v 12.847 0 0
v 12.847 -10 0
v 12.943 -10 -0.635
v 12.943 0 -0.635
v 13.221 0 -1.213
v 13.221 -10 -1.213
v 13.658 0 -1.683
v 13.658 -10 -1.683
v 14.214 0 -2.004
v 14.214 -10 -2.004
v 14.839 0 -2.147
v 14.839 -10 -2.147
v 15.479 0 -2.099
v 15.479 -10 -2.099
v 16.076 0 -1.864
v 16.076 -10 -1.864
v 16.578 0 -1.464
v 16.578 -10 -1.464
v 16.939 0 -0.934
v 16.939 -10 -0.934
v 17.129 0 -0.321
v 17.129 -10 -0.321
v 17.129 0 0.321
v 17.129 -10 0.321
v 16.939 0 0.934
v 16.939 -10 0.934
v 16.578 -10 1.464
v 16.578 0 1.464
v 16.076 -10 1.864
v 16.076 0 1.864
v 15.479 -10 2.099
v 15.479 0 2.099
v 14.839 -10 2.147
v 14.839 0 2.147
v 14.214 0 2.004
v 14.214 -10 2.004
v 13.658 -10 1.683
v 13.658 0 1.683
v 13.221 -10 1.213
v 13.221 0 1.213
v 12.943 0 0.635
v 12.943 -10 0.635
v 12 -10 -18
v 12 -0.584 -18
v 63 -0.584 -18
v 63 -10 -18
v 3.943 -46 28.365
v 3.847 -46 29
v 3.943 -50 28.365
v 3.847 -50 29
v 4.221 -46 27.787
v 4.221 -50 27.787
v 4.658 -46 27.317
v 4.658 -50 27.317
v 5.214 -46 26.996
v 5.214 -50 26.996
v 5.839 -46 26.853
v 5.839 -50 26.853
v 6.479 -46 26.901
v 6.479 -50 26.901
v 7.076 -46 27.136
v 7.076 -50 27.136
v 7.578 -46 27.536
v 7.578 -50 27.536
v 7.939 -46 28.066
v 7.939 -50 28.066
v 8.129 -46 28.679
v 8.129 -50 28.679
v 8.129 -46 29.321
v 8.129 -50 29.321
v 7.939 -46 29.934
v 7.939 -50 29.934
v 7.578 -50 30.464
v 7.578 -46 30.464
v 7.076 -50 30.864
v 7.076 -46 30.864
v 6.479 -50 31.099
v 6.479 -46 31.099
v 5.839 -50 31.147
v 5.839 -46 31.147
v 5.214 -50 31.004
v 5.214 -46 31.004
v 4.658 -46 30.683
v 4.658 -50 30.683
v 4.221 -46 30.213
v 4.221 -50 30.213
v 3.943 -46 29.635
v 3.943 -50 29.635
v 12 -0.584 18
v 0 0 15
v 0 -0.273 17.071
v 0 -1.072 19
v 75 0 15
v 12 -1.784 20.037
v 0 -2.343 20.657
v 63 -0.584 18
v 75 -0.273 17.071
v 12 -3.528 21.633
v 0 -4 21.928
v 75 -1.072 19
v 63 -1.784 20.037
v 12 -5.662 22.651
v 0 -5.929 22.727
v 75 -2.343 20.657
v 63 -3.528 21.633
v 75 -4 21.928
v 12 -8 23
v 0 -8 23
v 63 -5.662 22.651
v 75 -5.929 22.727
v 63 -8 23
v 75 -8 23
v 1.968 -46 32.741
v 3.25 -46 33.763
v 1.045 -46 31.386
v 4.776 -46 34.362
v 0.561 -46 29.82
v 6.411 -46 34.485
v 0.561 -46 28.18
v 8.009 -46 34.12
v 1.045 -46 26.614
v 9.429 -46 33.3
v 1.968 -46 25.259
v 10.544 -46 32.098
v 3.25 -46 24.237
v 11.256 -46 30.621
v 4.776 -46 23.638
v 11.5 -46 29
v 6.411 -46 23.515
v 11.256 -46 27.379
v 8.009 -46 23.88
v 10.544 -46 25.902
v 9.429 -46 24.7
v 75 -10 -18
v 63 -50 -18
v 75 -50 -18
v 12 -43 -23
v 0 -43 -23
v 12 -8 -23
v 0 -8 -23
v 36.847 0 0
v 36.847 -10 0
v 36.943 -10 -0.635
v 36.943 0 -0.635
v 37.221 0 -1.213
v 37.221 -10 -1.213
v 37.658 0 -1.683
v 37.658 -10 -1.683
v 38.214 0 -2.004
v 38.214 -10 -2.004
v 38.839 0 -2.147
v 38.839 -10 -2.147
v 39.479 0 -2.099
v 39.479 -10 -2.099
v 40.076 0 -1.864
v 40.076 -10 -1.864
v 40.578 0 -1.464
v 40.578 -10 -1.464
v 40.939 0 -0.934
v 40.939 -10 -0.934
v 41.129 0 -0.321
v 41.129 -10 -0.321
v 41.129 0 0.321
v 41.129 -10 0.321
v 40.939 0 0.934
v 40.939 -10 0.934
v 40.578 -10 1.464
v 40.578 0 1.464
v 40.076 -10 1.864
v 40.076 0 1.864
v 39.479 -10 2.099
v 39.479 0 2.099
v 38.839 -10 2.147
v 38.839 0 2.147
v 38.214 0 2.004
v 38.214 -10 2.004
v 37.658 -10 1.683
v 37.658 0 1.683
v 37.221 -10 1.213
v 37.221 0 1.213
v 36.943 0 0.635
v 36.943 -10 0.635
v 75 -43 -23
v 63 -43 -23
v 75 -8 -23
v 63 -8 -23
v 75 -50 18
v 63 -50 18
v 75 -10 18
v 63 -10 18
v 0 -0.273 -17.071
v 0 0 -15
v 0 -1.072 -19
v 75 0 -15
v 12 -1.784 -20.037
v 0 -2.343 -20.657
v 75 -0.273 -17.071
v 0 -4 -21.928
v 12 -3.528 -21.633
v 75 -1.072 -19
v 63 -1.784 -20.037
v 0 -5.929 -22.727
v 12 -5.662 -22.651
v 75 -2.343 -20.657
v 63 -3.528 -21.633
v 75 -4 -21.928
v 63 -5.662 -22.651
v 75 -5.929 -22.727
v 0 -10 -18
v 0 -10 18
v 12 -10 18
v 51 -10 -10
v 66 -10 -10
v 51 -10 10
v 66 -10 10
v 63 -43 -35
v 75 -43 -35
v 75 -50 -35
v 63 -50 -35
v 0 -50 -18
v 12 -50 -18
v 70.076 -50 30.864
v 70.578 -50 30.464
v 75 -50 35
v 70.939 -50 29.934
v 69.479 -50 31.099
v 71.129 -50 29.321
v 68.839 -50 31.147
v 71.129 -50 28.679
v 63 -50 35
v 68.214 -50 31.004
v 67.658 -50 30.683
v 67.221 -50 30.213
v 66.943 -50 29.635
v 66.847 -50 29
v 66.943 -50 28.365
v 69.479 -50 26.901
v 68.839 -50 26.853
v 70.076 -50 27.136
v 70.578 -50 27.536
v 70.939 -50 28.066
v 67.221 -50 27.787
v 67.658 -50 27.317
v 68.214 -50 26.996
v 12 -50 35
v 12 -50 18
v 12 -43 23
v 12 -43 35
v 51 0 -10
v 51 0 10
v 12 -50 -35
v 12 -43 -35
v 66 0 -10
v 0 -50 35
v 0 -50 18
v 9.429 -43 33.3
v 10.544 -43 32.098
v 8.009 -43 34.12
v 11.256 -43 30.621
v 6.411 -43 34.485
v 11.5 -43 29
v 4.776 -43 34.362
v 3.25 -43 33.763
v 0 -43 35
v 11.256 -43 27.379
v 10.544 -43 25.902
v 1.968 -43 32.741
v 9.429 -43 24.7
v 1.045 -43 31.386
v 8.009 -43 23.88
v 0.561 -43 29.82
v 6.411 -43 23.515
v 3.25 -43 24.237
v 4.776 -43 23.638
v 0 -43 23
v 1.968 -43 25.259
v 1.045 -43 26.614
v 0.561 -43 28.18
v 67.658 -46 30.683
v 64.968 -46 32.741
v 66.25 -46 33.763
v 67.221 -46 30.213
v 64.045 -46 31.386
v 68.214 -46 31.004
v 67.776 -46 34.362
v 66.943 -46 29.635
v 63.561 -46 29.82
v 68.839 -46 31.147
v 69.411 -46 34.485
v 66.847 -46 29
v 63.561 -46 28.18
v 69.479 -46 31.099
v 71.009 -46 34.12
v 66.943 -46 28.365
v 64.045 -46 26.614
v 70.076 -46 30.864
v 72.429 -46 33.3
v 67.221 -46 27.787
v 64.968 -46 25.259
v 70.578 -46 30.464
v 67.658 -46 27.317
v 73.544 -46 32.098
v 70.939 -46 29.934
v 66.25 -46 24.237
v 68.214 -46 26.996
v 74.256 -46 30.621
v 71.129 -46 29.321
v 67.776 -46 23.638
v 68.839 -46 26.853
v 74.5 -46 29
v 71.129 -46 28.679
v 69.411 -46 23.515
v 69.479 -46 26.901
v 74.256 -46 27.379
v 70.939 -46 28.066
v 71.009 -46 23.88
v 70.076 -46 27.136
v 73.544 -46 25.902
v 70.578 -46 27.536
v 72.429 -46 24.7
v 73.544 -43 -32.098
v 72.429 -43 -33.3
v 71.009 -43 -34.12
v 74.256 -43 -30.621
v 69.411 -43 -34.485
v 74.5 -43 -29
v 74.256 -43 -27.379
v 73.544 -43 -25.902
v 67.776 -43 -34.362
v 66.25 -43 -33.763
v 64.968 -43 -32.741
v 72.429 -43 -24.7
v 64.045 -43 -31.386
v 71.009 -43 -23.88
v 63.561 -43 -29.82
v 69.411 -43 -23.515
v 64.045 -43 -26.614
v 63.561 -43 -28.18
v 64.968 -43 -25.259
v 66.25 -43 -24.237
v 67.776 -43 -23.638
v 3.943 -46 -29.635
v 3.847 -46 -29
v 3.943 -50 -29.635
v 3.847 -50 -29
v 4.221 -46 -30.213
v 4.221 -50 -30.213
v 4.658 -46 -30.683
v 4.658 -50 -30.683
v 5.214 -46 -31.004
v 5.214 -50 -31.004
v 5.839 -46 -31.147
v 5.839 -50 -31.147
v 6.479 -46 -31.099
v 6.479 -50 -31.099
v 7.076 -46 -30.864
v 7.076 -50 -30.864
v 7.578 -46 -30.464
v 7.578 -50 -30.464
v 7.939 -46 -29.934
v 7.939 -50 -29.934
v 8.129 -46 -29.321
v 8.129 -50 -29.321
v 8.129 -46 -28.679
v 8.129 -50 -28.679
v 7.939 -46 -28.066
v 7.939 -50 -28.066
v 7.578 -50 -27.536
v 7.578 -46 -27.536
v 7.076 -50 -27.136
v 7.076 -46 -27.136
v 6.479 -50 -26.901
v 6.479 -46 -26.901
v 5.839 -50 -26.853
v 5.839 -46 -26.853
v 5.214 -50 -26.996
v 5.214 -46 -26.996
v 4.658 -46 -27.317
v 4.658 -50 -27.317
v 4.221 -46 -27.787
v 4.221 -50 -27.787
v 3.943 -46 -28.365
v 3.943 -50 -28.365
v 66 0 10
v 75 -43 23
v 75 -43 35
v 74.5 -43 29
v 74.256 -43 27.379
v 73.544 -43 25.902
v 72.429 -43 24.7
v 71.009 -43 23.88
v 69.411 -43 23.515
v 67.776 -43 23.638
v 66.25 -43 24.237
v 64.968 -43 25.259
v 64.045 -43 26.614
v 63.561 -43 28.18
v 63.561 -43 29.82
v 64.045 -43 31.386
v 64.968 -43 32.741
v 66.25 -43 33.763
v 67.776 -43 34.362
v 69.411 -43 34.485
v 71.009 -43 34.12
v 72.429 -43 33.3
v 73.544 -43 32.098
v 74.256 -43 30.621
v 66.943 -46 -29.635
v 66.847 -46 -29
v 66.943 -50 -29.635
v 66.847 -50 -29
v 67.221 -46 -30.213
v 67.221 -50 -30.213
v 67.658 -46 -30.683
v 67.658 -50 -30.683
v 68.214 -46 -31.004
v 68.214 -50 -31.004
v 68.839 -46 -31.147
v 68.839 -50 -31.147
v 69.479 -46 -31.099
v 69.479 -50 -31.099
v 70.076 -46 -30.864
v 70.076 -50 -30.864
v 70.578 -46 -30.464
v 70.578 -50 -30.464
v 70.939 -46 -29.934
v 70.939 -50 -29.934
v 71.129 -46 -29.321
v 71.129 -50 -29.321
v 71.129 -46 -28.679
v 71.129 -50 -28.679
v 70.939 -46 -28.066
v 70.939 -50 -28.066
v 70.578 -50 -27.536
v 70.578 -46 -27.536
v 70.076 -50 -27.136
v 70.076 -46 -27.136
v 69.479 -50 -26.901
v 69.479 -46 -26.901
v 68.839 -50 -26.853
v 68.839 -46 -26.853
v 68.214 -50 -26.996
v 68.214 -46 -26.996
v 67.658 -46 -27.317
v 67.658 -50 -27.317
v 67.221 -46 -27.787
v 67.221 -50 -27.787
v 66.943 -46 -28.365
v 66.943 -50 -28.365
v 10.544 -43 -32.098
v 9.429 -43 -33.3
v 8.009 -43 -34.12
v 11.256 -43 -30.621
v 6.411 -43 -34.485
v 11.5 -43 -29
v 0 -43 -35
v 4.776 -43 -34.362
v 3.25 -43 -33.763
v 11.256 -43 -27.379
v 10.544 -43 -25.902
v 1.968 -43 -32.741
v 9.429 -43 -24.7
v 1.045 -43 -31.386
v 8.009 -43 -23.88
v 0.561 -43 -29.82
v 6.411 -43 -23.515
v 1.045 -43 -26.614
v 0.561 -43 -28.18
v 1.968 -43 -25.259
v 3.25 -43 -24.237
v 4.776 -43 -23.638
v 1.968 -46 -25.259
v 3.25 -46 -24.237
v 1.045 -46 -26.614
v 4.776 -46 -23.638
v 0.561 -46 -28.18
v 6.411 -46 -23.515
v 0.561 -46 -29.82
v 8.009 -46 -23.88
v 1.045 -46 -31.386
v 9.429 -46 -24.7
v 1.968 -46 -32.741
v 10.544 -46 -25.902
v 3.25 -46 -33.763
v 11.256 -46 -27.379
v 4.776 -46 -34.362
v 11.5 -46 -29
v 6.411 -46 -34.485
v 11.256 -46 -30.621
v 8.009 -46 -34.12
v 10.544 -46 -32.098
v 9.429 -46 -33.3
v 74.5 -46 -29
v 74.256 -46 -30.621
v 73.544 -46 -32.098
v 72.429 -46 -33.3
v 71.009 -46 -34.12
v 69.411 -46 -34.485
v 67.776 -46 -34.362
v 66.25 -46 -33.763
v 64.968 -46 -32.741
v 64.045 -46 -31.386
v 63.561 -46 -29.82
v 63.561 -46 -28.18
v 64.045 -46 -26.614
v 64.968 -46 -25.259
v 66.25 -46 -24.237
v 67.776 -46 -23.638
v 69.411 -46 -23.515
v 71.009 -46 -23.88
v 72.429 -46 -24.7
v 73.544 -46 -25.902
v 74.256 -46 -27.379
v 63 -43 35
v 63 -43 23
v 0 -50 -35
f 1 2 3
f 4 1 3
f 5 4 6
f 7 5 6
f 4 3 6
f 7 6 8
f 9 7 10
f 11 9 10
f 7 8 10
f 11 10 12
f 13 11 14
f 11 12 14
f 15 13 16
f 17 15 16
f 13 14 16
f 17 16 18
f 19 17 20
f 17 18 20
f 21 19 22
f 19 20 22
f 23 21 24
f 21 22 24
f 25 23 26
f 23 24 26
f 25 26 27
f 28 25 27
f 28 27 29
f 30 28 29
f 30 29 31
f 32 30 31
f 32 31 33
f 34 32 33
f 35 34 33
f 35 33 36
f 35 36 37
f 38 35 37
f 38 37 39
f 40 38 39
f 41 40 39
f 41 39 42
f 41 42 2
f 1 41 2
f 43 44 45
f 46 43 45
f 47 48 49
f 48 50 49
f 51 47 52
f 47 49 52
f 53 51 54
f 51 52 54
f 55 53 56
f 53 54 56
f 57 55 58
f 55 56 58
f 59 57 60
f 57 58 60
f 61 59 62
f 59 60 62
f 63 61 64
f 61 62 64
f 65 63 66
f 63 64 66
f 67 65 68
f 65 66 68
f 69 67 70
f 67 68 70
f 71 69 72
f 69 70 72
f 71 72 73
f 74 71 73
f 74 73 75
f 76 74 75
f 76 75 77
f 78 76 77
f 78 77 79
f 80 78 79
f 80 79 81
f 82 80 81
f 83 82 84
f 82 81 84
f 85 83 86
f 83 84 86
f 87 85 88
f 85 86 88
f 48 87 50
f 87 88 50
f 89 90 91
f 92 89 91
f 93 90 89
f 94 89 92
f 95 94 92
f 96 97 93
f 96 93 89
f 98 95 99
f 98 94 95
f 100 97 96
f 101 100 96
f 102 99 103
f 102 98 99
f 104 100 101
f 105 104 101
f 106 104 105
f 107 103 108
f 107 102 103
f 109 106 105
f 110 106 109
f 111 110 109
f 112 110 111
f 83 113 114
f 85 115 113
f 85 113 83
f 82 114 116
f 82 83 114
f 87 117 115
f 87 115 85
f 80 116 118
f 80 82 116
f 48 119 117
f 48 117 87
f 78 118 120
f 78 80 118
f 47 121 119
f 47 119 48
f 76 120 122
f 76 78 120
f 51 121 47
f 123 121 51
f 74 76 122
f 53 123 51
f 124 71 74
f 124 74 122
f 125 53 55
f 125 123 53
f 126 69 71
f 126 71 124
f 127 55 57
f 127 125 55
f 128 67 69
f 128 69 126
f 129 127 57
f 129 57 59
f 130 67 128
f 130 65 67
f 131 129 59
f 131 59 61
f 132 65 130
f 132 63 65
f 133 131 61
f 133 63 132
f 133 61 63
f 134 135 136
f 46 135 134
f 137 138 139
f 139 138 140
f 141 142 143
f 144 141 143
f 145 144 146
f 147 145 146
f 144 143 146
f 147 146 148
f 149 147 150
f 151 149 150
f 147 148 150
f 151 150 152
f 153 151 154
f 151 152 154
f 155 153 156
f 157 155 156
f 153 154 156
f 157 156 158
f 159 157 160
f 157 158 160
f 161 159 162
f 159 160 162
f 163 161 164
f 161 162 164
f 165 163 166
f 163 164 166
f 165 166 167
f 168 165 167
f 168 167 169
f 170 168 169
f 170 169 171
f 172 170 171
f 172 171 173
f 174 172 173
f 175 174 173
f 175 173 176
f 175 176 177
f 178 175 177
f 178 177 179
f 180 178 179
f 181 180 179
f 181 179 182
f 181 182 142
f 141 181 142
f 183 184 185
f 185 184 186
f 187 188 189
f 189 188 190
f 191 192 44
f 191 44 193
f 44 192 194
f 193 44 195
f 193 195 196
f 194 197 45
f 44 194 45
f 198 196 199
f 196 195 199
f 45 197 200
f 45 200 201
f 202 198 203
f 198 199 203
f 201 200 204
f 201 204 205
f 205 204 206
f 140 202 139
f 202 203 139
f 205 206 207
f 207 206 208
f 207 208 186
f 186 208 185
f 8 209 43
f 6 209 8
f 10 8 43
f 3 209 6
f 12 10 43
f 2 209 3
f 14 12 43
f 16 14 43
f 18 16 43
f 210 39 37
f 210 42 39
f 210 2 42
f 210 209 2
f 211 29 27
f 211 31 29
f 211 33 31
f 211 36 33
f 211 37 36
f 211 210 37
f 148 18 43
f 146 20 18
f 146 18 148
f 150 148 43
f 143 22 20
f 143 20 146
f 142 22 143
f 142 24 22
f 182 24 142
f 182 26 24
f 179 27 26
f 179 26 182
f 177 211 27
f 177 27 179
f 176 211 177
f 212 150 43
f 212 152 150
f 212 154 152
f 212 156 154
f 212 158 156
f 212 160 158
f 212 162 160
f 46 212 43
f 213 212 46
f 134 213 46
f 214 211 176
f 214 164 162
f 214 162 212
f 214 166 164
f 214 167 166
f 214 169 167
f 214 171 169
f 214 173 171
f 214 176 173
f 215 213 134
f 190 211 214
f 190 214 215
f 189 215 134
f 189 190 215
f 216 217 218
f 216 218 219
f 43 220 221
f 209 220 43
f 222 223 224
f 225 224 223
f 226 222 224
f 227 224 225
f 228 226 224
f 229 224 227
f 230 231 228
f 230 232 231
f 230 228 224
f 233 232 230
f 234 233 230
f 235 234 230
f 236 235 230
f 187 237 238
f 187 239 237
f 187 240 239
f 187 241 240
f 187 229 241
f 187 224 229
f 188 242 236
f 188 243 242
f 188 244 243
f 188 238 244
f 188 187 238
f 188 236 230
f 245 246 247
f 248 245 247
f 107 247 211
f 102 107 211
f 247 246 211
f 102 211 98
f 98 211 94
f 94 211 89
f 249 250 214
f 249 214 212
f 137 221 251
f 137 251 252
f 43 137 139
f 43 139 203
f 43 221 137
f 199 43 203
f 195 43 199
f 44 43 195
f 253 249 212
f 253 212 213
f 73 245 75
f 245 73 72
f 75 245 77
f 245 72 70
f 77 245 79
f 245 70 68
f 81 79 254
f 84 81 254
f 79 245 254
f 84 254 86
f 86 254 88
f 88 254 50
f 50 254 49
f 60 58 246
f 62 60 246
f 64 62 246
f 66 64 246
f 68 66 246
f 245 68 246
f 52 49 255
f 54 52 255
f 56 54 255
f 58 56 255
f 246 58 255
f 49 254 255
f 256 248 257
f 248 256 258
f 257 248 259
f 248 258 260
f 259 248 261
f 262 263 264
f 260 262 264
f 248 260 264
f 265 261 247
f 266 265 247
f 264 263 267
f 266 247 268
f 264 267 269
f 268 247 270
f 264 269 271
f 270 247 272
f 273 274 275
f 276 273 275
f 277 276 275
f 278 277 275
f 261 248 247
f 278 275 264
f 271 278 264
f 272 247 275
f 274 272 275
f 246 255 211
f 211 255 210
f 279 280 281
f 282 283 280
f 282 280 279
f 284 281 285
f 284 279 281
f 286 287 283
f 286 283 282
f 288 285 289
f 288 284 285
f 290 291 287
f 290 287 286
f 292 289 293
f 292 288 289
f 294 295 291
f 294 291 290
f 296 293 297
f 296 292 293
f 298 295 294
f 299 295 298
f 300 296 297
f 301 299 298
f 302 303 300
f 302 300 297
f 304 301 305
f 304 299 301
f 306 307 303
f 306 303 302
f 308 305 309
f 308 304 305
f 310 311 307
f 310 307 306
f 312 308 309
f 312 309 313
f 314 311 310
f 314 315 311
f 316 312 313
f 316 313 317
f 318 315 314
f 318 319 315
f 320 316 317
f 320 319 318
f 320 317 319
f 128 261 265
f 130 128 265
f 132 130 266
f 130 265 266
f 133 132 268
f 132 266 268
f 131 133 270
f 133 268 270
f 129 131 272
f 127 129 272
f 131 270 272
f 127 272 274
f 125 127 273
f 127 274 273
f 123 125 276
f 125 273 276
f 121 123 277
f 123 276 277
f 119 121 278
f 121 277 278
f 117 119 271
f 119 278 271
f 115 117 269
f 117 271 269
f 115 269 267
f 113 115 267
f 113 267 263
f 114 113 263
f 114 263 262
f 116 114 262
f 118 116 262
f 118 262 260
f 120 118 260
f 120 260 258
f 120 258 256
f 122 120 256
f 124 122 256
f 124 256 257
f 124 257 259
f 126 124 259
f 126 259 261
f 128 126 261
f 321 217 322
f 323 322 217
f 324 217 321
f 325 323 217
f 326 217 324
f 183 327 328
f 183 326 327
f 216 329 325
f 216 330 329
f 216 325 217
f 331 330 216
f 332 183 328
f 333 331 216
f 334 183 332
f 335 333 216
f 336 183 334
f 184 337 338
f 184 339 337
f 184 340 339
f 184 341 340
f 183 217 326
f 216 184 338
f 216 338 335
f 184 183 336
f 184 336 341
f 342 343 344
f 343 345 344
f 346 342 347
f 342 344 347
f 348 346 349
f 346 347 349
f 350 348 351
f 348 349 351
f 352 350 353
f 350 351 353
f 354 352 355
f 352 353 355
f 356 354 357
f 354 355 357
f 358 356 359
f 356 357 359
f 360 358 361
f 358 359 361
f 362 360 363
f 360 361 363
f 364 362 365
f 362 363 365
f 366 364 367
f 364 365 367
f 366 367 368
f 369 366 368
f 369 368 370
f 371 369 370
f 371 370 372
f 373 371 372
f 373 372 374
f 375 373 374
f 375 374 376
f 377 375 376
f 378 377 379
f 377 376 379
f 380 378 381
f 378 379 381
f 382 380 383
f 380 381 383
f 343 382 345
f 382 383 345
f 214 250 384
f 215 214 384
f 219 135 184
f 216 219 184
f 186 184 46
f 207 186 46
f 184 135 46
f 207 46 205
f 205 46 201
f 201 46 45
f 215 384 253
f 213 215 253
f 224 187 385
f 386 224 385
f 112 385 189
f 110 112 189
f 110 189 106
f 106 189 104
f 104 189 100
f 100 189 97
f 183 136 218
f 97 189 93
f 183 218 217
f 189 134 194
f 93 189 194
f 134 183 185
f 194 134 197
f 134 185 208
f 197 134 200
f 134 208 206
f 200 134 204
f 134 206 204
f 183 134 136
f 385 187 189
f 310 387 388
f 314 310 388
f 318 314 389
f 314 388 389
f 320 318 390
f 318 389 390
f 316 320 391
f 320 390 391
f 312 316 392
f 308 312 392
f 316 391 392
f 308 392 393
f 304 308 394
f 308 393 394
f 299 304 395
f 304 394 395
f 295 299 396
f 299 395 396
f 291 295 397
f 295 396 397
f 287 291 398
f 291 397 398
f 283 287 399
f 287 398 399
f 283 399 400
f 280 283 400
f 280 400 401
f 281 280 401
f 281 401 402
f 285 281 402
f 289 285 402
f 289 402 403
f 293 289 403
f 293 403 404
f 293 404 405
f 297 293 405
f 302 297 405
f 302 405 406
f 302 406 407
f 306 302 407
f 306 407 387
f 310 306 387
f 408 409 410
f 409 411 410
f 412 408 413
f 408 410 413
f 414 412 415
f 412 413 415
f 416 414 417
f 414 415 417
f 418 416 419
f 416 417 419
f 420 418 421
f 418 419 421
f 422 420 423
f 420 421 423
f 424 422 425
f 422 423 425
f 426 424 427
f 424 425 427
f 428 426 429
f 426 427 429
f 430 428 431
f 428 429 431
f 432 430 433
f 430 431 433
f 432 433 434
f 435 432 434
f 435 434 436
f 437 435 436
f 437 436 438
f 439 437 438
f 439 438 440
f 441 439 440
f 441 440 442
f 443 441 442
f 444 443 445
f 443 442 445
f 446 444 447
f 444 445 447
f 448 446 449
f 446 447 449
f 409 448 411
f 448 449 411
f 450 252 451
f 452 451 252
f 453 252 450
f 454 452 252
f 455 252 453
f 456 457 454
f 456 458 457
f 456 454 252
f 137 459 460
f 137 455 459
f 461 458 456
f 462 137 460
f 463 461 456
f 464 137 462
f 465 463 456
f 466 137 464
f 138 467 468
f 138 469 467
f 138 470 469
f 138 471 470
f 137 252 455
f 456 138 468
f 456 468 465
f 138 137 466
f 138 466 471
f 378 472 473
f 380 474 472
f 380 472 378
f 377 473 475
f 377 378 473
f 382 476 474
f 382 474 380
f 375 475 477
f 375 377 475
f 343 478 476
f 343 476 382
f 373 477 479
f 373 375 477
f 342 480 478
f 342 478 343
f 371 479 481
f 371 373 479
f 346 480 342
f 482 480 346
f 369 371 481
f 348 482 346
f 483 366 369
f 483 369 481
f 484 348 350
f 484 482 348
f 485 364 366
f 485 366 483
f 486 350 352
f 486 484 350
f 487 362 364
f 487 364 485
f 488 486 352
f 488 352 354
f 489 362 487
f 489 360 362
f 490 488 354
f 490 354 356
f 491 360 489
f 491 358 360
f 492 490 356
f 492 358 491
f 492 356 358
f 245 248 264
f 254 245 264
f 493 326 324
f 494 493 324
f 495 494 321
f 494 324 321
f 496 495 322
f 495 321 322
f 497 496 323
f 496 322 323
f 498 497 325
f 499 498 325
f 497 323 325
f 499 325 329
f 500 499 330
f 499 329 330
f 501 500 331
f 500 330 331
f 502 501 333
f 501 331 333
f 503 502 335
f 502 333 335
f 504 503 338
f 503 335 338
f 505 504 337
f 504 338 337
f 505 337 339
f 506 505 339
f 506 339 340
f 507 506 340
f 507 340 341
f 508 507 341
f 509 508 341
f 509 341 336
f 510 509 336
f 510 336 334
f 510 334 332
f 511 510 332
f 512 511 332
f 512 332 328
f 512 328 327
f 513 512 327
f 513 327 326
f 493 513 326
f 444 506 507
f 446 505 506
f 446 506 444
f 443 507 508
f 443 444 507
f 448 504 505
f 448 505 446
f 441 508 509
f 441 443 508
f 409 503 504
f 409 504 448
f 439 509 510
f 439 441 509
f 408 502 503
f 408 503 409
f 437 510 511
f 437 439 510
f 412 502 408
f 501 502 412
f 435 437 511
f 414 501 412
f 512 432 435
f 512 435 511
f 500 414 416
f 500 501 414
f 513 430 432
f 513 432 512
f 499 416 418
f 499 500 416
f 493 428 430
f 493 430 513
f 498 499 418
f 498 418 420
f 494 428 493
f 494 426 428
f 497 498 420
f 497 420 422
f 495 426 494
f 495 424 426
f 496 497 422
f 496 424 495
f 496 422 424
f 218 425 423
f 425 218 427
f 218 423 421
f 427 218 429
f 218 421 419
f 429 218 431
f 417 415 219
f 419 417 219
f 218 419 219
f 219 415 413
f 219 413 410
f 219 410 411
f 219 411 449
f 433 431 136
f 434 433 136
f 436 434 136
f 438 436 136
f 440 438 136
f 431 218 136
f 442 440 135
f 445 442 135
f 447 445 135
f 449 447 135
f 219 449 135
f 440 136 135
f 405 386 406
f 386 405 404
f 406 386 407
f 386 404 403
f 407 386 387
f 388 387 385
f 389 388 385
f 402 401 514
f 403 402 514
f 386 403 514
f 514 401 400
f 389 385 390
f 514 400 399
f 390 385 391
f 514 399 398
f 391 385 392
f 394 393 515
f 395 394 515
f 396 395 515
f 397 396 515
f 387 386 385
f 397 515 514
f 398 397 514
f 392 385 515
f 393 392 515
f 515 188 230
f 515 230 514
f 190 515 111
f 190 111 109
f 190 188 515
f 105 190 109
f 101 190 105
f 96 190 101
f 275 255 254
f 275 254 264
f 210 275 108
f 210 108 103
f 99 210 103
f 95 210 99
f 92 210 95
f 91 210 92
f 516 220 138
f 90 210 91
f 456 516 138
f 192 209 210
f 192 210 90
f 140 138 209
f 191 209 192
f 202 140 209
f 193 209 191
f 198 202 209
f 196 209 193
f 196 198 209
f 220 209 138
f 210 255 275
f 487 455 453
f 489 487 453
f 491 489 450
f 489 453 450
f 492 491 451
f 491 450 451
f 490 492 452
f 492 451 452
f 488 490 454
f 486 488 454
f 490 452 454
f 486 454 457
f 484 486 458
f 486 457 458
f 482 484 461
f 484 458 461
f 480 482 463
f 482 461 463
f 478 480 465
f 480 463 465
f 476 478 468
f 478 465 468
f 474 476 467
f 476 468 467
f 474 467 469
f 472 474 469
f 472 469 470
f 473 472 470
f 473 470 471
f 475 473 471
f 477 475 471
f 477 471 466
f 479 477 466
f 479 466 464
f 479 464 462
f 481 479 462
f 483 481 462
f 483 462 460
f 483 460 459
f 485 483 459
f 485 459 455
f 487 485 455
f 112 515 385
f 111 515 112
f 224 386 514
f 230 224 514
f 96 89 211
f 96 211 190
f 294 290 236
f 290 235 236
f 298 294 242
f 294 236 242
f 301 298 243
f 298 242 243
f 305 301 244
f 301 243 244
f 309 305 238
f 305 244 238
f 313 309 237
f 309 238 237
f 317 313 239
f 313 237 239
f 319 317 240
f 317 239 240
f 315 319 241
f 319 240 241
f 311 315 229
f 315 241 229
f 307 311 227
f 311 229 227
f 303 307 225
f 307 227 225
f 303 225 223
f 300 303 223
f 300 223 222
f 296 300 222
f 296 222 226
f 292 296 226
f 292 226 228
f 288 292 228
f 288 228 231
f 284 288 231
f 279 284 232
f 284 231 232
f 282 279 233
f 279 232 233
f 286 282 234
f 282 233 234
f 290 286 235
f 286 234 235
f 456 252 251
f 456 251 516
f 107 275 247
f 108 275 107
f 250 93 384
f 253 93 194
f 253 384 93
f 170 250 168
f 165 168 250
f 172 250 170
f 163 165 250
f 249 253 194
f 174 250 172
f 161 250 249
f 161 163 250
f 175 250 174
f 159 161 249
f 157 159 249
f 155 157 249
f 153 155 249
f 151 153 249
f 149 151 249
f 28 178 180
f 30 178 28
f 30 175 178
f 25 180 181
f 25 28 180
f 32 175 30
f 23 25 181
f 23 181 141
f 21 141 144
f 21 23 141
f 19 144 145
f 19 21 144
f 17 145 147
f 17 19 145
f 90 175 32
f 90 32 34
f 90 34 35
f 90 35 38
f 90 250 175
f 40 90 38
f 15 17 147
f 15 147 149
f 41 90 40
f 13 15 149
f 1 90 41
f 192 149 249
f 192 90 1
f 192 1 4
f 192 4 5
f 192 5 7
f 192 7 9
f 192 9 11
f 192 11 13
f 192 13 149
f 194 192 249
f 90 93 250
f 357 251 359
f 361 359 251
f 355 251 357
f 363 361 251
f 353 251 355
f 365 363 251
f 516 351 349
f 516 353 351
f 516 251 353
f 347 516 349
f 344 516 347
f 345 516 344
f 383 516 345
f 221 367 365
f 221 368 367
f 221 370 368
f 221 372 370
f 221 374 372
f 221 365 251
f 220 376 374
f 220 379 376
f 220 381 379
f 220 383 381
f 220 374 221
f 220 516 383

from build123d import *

# Parameters (mm, degrees)
STRUCTURE_W                                     = 75
STRUCTURE_H                                     = 18
BOSS_CORPS_DEPTH                                = 10
BOSS_PATES_OUTLINE_W                            = 50
BOSS_PATES_OUTLINE_H                            = 5
BOSS_PATES_DEPTH                                = 12
BOSS_PATES_START                                = 63
BOSS_PATES_2_OUTLINE_W                          = 50
BOSS_PATES_2_OUTLINE_H                          = 5
BOSS_PATES_2_DEPTH                              = 12
SKETCH2_W                                       = 12
SKETCH2_H                                       = 7
BOSS_ATTACHES_DEPTH                             = 12
F_6_CLEARANCE_HOLE1_D                           = 4.3053
CBORE_FOR_6_PAN_HEAD_MACHINE_SCREW1_D           = 4.3053
CBORE_FOR_6_PAN_HEAD_MACHINE_SCREW1_CBORE_D     = 11.0000034
CBORE_FOR_6_PAN_HEAD_MACHINE_SCREW1_CBORE_DEPTH = 2.999994
FILLET1_R                                       = 8
CUT_EXTRUDE1_REACH                              = 98.695
SKETCH10_W                                      = 15
SKETCH10_H                                      = 20


# Read off the part's stored shape, not the designer's step: Boss-Pates
with BuildPart() as part:
    # Structure → Boss-Corps (new body)
    with BuildSketch(Plane(origin=(0, 0, 0), x_dir=(1, 0, 0), z_dir=(0, 1, 0))):
        with Locations((37.5, 9)):
            Rectangle(STRUCTURE_W, STRUCTURE_H)
    extrude(amount=-BOSS_CORPS_DEPTH)

    # Boss-Pates outline → Boss-Pates (add)
    with BuildSketch(Plane.YZ):
        with Locations((-25, -20.5)):
            Rectangle(BOSS_PATES_OUTLINE_W, BOSS_PATES_OUTLINE_H)
    extrude(amount=BOSS_PATES_DEPTH)

    # Boss-Pates 2 outline → Boss-Pates 2 (add)
    with BuildSketch(Plane.YZ.offset(BOSS_PATES_START)):
        with Locations((-25, -20.5)):
            Rectangle(BOSS_PATES_2_OUTLINE_W, BOSS_PATES_2_OUTLINE_H)
    extrude(amount=BOSS_PATES_2_DEPTH)

    # Sketch2 → Boss-Attaches (add)
    with BuildSketch(Plane(origin=(0, 0, -23), x_dir=(-1, 0, 0), z_dir=(0, 0, -1))):
        with Locations((-69, -46.5)):
            Rectangle(SKETCH2_W, SKETCH2_H)
        with Locations((-6, -46.5)):
            Rectangle(SKETCH2_W, SKETCH2_H)
    extrude(amount=BOSS_ATTACHES_DEPTH)

    # Mirror4: part across plane


with BuildPart() as part_1:
    add(part.part)
    add(part.part.mirror(Plane(origin=(0, -10, 0), x_dir=(1, 0, 0), z_dir=(0, 0, 1))))

    # #6 Clearance Hole1 (through all)
    with Locations(Plane(origin=(0, 0, 0), x_dir=(1, 0, 0), z_dir=(0, 1, 0))):
        with Locations((15, 0), (39, 0)):
            Hole(F_6_CLEARANCE_HOLE1_D / 2)

    # CBORE for #6 Pan Head Machine Screw1 (through all)
    with Locations(Plane(origin=(0, -43, 0), x_dir=(1, 0, 0), z_dir=(0, 1, 0))):
        with Locations((6, 29), (69, 29), (69, -29), (6, -29)):
            CounterBoreHole(CBORE_FOR_6_PAN_HEAD_MACHINE_SCREW1_D / 2, CBORE_FOR_6_PAN_HEAD_MACHINE_SCREW1_CBORE_D / 2, CBORE_FOR_6_PAN_HEAD_MACHINE_SCREW1_CBORE_DEPTH)

    # Fillet1
    fillet1_edges = [part_1.edges().sort_by_distance(p)[0] for p in [
        (69, 0, -23),
        (6, 0, 23),
    ]]
    fillet(fillet1_edges, radius=FILLET1_R)

    # Sketch10 → Cut-Extrude1 (cut, up to next)
    with BuildSketch(Plane(origin=(0, 0, 0), x_dir=(1, 0, 0), z_dir=(0, 1, 0)), mode=Mode.PRIVATE) as cut_extrude1_sk1:
        with Locations((58.5, 0)):
            Rectangle(SKETCH10_W, SKETCH10_H)
    cut_extrude1_tool1 = extrude(cut_extrude1_sk1.sketch, amount=-CUT_EXTRUDE1_REACH, mode=Mode.PRIVATE) & part_1.part
    add(cut_extrude1_tool1.solids().sort_by_distance((58.5, 0, 0))[0], mode=Mode.SUBTRACT)


solid = part_1.part
